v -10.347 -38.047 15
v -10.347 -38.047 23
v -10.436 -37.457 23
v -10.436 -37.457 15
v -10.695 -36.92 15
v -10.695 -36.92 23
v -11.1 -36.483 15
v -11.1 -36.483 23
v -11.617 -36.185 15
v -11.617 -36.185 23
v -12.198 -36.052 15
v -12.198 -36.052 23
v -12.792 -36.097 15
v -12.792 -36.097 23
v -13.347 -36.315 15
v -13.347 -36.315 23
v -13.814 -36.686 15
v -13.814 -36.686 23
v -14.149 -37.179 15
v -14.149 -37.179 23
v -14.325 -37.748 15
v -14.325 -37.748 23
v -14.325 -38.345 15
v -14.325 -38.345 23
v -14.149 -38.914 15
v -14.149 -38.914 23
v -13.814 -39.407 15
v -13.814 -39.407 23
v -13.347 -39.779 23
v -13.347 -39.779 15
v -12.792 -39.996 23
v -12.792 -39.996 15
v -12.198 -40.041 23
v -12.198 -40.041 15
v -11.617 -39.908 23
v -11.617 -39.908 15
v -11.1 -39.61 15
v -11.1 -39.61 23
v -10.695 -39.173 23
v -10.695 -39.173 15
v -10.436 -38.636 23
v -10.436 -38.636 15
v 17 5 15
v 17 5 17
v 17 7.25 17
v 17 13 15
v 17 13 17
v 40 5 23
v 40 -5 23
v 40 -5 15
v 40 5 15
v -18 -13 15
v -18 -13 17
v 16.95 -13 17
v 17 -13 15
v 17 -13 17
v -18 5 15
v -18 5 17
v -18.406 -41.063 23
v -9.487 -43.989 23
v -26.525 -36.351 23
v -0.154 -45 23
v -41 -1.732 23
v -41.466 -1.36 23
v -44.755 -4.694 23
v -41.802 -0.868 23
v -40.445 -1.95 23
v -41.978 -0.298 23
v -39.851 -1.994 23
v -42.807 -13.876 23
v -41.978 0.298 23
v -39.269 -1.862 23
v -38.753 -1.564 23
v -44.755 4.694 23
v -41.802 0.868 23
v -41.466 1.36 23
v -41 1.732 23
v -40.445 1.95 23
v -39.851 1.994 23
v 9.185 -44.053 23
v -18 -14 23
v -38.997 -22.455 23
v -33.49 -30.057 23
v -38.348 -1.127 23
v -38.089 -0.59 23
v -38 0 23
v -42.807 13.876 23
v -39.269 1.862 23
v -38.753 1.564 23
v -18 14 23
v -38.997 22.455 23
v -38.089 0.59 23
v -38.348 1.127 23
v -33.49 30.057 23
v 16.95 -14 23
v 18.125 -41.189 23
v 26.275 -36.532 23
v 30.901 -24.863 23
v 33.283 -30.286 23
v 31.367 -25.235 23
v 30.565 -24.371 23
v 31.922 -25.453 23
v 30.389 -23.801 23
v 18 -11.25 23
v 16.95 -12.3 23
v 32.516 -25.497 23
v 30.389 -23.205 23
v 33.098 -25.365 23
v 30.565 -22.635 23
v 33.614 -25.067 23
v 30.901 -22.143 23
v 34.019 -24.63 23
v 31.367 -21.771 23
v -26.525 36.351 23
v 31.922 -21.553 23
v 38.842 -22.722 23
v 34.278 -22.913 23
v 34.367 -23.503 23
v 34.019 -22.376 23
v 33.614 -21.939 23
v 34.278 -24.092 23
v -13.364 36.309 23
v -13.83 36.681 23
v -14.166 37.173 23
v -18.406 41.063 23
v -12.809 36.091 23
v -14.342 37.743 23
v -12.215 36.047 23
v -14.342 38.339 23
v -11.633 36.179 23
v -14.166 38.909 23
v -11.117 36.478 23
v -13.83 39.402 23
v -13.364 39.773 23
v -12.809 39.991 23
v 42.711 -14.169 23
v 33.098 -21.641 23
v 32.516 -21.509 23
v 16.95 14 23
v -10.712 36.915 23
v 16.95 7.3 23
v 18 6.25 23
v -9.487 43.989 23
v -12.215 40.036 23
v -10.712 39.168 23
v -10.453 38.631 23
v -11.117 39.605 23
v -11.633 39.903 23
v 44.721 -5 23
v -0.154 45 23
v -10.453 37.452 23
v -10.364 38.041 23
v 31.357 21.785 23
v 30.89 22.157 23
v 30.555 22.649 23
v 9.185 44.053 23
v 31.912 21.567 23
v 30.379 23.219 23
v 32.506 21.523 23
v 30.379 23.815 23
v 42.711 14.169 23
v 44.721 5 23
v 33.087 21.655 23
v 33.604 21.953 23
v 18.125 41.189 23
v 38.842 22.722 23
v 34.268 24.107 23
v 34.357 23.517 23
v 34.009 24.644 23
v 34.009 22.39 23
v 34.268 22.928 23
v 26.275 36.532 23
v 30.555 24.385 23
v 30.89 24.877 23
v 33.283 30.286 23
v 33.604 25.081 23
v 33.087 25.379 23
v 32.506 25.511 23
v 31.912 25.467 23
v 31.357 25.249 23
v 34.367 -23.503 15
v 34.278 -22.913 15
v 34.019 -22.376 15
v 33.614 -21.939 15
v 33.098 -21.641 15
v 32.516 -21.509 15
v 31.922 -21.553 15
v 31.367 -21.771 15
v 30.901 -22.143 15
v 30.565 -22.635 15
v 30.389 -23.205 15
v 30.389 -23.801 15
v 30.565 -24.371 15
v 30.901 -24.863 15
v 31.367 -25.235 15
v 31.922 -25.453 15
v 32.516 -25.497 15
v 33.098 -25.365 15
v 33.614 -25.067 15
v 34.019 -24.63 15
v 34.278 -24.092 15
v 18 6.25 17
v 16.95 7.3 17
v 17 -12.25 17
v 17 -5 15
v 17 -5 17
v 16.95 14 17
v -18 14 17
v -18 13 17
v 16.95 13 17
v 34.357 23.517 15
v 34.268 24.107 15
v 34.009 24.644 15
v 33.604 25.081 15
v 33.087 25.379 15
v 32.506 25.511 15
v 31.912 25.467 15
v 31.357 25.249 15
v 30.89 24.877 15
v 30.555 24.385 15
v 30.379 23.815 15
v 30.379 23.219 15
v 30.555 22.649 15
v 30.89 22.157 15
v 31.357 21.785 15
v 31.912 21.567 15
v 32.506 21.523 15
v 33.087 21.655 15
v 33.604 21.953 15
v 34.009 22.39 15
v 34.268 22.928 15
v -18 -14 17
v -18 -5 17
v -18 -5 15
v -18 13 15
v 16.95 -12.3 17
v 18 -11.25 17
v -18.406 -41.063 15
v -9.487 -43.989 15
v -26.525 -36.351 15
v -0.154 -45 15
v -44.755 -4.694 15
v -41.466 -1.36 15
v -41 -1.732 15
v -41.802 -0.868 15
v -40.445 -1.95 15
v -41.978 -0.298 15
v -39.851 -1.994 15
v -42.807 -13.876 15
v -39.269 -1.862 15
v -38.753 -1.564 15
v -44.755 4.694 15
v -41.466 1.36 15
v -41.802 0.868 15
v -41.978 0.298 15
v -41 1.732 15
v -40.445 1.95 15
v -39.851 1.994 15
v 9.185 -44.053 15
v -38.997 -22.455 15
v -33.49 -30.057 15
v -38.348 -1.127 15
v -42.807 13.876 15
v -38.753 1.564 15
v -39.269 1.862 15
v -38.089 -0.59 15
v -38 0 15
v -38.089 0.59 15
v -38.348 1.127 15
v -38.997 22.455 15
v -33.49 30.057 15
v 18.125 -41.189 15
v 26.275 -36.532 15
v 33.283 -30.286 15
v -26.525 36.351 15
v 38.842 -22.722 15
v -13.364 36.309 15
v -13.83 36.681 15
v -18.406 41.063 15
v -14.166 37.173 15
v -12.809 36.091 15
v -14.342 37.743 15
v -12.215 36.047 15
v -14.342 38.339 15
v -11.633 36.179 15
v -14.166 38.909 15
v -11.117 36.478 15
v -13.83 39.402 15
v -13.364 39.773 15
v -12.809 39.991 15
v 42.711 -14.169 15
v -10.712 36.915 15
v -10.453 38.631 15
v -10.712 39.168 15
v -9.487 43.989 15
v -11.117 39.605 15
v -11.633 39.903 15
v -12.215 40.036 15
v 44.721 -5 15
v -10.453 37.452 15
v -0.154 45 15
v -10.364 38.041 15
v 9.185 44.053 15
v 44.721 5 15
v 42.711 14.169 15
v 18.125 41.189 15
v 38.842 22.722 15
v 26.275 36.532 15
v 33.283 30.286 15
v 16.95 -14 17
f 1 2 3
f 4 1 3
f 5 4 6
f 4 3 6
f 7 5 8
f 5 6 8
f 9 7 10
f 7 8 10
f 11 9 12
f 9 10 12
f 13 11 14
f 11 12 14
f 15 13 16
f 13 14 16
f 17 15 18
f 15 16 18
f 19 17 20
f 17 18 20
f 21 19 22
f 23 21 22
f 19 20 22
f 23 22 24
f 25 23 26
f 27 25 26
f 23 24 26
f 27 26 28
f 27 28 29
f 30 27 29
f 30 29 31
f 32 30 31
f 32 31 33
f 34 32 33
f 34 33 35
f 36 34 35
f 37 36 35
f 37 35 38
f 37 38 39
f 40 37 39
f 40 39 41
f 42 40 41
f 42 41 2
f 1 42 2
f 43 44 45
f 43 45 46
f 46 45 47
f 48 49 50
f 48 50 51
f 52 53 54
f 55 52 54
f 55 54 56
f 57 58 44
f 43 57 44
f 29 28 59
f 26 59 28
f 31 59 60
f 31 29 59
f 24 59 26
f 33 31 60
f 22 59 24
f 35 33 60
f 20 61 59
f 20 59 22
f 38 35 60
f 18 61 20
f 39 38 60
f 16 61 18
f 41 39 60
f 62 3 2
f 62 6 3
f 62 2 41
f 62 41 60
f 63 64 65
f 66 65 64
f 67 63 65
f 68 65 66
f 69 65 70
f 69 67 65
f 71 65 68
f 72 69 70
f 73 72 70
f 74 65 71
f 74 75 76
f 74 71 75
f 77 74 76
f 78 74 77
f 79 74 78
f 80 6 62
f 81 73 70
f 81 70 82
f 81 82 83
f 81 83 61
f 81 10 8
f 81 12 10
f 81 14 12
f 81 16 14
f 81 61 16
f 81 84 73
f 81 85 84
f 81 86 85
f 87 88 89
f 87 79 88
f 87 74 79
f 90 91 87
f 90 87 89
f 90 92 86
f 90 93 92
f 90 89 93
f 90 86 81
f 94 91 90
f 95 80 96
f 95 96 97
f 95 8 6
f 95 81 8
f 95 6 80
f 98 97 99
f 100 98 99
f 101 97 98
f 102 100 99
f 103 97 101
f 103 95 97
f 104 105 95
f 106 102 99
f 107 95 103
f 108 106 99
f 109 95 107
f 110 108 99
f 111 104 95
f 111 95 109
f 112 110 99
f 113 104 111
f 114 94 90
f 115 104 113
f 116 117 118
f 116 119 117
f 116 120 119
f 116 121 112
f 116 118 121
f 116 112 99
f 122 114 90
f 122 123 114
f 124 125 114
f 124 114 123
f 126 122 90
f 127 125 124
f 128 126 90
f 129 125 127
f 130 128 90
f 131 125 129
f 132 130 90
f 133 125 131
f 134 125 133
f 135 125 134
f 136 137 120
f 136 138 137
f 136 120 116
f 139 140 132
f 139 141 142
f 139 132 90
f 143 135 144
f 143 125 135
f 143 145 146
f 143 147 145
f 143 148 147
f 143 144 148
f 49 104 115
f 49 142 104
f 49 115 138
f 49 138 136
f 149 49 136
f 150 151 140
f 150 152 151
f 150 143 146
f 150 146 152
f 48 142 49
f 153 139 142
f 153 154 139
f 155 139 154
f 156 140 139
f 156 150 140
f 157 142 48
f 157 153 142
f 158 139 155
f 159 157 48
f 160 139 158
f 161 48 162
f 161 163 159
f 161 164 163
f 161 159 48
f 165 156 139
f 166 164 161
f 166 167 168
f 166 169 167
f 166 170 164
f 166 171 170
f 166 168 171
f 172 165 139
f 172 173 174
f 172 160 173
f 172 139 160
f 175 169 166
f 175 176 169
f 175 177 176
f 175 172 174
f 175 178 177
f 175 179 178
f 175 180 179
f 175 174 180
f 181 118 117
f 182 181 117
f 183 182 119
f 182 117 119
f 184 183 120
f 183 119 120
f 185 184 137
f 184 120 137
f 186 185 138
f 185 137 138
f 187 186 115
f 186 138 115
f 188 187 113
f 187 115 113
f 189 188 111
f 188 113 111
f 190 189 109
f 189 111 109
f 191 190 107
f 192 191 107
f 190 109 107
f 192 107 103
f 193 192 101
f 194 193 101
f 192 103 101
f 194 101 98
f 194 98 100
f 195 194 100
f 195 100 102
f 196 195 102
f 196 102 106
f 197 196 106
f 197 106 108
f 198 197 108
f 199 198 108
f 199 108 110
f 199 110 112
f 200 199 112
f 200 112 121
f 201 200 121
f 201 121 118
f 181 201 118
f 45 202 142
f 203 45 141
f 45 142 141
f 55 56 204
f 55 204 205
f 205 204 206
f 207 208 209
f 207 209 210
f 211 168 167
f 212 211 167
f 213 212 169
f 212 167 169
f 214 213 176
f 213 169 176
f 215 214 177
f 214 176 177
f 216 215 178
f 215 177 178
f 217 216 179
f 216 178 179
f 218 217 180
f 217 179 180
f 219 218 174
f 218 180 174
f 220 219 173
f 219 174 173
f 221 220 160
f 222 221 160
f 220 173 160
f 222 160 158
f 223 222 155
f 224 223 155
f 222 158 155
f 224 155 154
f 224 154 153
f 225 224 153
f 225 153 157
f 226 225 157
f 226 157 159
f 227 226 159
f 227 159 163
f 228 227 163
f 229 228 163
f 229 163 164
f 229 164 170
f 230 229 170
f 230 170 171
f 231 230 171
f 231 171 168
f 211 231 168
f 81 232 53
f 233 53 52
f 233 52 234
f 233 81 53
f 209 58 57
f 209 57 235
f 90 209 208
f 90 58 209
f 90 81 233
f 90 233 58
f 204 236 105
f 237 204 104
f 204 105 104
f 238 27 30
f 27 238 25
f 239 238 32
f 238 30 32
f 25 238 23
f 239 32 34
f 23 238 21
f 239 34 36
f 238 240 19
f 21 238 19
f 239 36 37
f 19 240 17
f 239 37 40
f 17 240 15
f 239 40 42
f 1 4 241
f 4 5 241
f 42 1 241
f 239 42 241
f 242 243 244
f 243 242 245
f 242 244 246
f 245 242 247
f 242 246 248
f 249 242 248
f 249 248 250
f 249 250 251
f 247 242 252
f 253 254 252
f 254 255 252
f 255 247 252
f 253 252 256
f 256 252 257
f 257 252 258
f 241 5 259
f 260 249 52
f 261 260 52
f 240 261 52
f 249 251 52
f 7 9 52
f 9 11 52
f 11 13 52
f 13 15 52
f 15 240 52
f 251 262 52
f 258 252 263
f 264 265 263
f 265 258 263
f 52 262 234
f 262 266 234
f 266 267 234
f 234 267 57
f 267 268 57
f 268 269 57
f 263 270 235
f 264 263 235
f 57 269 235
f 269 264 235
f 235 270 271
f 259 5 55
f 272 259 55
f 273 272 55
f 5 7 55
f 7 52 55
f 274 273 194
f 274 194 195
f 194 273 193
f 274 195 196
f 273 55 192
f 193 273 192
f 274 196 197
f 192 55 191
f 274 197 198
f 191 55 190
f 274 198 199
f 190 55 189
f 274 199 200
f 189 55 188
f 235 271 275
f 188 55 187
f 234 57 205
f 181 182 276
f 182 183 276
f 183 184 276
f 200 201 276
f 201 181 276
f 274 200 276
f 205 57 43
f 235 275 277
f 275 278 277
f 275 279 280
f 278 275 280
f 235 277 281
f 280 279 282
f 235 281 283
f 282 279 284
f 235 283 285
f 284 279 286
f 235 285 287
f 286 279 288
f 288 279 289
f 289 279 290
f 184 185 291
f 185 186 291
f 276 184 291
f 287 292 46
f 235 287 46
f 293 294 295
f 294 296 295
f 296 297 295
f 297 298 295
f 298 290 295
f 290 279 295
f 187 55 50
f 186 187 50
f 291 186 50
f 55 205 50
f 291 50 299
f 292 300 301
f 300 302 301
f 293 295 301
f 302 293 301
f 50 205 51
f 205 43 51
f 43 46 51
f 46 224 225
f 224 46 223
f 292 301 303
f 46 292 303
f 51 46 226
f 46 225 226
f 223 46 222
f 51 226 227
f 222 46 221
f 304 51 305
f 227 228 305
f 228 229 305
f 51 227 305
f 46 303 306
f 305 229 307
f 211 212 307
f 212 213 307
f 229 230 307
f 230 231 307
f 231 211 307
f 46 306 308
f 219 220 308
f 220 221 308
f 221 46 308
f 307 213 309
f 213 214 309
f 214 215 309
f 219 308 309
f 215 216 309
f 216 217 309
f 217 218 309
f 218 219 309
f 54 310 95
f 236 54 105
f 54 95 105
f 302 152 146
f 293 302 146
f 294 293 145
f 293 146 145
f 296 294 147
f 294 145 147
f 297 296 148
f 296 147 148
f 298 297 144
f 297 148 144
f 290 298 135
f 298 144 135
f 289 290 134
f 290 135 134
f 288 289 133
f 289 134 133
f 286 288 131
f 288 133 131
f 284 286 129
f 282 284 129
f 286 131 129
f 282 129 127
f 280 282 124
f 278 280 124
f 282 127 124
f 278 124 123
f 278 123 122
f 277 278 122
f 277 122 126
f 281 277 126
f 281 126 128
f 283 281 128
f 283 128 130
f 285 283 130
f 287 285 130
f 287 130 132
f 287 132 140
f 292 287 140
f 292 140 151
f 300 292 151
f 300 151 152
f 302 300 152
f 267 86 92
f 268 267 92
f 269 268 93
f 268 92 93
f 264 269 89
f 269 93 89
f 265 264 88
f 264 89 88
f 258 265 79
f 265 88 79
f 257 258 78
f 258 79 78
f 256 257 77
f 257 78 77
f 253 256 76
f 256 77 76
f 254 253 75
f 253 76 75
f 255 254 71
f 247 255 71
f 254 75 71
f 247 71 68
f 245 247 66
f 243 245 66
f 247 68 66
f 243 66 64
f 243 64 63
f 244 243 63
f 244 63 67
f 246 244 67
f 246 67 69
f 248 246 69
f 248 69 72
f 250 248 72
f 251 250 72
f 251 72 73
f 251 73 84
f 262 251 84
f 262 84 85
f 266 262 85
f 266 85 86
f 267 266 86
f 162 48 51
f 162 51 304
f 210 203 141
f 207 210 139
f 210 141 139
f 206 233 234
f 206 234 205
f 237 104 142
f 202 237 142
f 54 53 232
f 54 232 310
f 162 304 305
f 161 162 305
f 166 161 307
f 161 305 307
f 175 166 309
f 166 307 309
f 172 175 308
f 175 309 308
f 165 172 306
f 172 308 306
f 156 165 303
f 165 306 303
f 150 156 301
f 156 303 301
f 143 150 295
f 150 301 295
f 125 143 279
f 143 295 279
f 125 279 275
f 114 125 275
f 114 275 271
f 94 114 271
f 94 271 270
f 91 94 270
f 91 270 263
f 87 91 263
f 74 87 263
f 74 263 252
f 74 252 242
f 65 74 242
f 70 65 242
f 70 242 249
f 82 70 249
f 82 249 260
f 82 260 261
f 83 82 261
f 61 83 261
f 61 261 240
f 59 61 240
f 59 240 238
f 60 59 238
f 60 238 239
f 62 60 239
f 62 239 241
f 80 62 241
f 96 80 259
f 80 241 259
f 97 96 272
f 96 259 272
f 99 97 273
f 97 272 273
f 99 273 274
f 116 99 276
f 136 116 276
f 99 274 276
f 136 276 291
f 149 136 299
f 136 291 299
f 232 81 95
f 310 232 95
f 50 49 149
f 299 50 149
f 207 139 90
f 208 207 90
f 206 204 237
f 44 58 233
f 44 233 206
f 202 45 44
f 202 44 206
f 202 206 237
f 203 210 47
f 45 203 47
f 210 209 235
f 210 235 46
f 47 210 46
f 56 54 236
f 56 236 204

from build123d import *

# Parameters (mm, degrees)
SKETCH_R        = 45
PAD_DEPTH       = 8
POCKET_DEPTH    = 6
SKETCH013_R     = 2
POCKET006_DEPTH = 10
SKETCH016_W     = 35
SKETCH016_H     = 8
POCKET009_DEPTH = 5
SKETCH017_W     = 5
SKETCH017_H     = 10
POCKET010_DEPTH = 10


with BuildPart() as part:
    # Sketch → Pad (new body)
    with BuildSketch(Plane.XY):
        Circle(SKETCH_R)
    extrude(amount=PAD_DEPTH)

    # Sketch002 (on Face3 of Pad) → Pocket (cut)
    with BuildSketch(Plane.XY.offset(8)):
        Polygon((-18, 14), (-18, -14), (16.95, -14), (16.95, -12.3), (18, -11.25), (18, 6.25), (16.95, 7.3), (16.95, 14), align=None)
    extrude(amount=-POCKET_DEPTH, mode=Mode.SUBTRACT)

    # Sketch013 (on Face3 of Pocket) → Pocket006 (cut)
    with BuildSketch(Plane.XY.offset(8)):
        with Locations((-40, 0)):
            Circle(SKETCH013_R)
        with Locations((-12.363995, 38.041183)):
            Circle(SKETCH013_R)
        with Locations((32.356581, 23.51705)):
            Circle(SKETCH013_R)
        with Locations((32.366826, -23.502949)):
            Circle(SKETCH013_R)
        with Locations((-12.347418, -38.046567)):
            Circle(SKETCH013_R)
    extrude(amount=-POCKET006_DEPTH, mode=Mode.SUBTRACT)

    # Sketch016 (on Face17 of Pocket006) → Pocket009 (cut)
    with BuildSketch(Plane.XY.offset(2)):
        with Locations((-0.5, -9)):
            Rectangle(SKETCH016_W, SKETCH016_H)
        with Locations((-0.5, 9)):
            Rectangle(SKETCH016_W, SKETCH016_H)
    extrude(amount=-POCKET009_DEPTH, mode=Mode.SUBTRACT)

    # Sketch017 (on Face3 of Pocket009) → Pocket010 (cut)
    with BuildSketch(Plane.XY.offset(8)):
        with Locations((42.5, 0)):
            Rectangle(SKETCH017_W, SKETCH017_H)
    extrude(amount=-POCKET010_DEPTH, mode=Mode.SUBTRACT)


with BuildPart() as part_1:
    # Body placement: moved
    add(part.part.moved(Location((0, 0, 15))))


solid = part_1.part
